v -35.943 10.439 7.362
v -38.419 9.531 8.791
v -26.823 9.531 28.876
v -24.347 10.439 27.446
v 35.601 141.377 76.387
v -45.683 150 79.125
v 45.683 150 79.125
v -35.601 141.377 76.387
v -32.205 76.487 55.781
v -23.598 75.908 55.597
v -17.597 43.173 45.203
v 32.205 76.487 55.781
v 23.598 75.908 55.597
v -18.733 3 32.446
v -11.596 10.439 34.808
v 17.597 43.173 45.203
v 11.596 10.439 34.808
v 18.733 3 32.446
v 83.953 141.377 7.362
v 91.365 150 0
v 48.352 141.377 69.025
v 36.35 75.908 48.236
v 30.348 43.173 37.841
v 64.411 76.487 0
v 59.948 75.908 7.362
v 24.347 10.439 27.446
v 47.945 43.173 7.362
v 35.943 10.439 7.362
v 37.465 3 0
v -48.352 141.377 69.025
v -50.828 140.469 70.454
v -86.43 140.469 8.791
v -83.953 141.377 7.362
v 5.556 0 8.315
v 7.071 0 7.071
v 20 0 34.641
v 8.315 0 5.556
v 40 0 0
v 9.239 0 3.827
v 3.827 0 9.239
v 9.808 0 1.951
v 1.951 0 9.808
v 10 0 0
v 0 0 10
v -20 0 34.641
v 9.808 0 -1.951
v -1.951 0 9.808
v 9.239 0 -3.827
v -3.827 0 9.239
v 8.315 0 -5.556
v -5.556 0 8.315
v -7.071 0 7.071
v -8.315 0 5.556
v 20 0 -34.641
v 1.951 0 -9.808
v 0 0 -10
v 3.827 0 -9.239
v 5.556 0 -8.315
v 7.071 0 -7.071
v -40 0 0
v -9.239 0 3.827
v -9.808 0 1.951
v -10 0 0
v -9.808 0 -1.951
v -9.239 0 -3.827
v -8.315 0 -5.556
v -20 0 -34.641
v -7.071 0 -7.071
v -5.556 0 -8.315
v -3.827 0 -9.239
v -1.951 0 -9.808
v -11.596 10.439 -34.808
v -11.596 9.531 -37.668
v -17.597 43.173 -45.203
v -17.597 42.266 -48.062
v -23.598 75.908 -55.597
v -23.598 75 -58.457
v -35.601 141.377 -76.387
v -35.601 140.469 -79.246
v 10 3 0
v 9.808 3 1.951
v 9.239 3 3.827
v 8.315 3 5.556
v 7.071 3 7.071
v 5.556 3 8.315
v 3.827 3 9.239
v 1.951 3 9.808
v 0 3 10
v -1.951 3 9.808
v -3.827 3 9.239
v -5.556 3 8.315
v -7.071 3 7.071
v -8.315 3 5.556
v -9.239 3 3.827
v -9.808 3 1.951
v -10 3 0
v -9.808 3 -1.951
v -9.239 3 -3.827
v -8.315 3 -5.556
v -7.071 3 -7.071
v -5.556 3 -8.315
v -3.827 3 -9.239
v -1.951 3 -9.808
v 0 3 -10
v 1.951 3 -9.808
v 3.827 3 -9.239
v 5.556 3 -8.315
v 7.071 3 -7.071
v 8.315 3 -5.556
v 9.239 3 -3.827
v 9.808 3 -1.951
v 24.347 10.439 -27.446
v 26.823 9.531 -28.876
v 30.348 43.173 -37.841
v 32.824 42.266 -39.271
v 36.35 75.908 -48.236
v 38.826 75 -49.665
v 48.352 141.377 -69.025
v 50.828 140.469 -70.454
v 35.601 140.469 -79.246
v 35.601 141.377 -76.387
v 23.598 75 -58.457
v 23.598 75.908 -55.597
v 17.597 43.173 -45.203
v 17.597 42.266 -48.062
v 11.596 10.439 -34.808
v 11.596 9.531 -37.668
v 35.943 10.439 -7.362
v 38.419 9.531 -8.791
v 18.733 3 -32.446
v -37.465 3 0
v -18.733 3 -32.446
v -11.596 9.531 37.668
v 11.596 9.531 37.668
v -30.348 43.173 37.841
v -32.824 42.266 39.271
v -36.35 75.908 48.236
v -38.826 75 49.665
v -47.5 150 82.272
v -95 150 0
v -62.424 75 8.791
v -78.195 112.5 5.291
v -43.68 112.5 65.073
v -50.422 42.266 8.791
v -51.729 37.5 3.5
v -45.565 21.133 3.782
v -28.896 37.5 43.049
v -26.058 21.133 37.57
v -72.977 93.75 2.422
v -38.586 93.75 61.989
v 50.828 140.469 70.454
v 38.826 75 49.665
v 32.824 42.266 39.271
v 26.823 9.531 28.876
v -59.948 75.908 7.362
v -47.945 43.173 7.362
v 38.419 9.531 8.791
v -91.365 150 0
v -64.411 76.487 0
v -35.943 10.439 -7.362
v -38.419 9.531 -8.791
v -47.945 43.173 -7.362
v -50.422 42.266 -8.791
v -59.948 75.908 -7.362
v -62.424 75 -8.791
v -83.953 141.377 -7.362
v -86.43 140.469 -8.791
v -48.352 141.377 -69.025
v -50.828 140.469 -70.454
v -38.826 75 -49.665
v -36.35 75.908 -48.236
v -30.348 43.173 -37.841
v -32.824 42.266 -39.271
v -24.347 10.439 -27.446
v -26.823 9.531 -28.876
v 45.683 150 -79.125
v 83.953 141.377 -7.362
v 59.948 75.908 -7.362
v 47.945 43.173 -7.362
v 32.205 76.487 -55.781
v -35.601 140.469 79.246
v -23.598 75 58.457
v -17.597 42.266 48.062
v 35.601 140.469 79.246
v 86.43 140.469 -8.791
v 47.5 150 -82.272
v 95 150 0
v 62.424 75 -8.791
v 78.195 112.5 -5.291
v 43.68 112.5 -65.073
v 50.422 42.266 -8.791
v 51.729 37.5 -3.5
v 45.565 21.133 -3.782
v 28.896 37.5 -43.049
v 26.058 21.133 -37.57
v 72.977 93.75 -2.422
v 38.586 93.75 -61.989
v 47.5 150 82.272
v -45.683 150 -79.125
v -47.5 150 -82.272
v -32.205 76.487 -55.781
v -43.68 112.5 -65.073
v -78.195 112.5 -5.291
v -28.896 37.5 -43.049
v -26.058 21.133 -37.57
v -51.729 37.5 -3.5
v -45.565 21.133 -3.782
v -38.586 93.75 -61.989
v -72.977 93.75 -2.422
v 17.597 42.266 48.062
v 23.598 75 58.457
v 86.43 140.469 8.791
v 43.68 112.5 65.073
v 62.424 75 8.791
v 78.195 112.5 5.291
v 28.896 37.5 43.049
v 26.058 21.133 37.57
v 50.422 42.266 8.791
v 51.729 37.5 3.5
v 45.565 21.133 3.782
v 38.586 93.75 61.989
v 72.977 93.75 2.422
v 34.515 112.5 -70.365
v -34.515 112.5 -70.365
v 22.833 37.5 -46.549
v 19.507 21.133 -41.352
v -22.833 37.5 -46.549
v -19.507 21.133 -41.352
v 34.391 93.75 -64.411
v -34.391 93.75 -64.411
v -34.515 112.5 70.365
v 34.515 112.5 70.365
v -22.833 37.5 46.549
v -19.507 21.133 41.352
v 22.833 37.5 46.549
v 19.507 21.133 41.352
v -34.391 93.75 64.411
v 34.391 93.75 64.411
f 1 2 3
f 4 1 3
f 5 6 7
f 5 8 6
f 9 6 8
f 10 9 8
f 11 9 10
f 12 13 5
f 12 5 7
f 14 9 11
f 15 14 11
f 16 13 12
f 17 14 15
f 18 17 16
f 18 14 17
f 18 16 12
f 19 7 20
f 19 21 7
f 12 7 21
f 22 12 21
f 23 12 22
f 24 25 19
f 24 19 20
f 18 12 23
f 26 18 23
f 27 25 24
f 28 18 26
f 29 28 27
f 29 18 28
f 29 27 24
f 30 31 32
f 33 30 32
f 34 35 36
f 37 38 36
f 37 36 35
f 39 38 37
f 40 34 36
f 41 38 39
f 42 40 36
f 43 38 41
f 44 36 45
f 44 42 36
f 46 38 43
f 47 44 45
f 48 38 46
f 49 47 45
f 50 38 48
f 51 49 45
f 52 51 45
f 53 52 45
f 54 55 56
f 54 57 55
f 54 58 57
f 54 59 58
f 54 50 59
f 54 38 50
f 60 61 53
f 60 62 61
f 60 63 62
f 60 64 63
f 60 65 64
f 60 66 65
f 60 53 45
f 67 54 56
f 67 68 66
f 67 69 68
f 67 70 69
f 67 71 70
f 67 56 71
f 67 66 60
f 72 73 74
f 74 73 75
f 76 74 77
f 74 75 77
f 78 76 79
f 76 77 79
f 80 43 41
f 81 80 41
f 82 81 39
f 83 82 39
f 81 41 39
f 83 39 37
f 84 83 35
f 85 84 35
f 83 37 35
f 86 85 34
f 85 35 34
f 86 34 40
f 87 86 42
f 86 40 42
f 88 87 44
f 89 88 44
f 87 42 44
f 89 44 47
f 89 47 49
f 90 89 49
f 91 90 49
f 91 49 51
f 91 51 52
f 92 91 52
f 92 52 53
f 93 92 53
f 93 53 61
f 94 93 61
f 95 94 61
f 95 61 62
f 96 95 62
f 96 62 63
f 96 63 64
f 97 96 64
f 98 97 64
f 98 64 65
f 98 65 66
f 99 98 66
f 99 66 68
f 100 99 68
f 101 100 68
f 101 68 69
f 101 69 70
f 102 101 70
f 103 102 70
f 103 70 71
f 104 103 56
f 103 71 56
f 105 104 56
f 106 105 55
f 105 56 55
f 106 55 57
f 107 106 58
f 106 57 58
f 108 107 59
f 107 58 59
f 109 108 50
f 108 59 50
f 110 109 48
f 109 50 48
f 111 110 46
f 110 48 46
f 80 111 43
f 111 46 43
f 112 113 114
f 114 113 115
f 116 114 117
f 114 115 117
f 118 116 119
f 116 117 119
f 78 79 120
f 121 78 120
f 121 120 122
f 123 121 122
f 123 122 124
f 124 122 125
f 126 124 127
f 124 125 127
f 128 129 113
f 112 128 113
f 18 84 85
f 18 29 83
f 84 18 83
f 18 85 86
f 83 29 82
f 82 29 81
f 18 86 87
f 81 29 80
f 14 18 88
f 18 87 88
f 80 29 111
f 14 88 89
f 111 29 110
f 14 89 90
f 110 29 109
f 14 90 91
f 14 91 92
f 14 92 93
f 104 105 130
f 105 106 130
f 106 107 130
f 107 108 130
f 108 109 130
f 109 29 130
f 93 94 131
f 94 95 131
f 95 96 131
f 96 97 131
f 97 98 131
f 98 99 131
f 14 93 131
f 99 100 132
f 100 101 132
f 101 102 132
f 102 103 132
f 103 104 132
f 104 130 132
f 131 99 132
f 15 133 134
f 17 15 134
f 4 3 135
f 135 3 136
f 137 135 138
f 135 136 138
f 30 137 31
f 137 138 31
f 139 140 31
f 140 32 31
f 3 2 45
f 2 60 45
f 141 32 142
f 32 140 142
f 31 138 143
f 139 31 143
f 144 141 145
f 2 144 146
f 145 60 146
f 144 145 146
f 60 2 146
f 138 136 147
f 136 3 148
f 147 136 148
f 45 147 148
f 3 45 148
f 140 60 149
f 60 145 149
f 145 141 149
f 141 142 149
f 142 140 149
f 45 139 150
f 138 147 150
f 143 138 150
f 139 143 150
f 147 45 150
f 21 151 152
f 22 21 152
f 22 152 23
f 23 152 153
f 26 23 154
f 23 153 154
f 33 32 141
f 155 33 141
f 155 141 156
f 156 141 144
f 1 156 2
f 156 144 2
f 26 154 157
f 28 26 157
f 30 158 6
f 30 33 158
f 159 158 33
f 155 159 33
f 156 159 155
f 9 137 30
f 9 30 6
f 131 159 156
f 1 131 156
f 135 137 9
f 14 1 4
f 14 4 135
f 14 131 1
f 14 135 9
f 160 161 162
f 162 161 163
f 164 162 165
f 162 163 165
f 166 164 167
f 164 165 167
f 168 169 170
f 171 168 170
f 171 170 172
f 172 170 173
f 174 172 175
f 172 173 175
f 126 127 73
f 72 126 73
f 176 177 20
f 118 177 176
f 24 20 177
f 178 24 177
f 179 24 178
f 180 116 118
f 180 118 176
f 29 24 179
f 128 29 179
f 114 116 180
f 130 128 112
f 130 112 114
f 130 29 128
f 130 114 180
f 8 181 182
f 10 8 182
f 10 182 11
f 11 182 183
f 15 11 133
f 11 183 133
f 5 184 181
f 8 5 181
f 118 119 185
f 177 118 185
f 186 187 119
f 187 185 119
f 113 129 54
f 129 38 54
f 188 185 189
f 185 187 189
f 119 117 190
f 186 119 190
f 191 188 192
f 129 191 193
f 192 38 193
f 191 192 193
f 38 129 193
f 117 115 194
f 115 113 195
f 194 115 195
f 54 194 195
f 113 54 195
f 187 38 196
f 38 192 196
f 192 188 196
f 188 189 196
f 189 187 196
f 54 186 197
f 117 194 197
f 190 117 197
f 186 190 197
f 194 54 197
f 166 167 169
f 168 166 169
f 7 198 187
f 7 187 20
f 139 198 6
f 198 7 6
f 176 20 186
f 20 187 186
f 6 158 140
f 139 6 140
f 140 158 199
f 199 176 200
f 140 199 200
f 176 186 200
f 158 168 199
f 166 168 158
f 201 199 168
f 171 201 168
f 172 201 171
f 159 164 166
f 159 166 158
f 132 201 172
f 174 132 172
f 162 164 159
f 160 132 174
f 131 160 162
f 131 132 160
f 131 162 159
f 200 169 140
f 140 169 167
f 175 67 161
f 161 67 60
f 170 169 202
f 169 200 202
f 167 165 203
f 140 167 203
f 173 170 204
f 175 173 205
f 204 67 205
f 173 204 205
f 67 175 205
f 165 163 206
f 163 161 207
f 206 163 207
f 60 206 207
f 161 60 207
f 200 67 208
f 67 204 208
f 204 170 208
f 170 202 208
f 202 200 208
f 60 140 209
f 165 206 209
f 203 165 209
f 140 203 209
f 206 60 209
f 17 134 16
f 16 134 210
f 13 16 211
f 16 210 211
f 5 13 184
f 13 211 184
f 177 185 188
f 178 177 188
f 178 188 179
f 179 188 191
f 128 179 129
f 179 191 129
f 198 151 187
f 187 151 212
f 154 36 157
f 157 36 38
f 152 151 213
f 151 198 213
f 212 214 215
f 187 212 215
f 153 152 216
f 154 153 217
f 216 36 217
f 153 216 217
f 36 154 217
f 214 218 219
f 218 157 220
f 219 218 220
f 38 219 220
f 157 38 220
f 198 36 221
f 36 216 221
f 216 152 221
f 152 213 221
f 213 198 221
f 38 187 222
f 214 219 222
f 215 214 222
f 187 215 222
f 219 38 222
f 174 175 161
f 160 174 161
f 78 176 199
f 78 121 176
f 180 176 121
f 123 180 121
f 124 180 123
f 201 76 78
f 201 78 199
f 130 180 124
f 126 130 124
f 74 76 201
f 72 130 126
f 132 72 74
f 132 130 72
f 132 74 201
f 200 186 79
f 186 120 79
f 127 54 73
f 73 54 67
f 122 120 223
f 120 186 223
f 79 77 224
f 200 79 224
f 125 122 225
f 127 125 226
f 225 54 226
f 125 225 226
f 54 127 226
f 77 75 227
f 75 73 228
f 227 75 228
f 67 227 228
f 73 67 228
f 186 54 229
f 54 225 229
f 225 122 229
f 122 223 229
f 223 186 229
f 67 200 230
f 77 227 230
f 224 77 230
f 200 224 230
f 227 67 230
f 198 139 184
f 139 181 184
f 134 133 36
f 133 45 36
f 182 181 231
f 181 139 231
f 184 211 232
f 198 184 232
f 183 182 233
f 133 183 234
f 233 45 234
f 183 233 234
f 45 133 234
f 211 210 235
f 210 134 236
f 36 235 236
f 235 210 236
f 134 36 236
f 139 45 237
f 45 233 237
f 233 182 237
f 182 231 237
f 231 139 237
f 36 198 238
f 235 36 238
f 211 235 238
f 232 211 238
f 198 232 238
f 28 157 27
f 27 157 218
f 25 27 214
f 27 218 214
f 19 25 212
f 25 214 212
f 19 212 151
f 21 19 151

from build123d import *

# Parameters (mm, degrees)
VACIADO1_T            = -3
CORTAR_EXTRUIR1_DEPTH = 3
CORTAR_EXTRUIR2_REACH = 152
CROQUIS4_R            = 10
MATRIZC1_COUNT        = 6


with BuildPart() as part:
    # Croquis2 → Recubrir1 section 0
    with BuildSketch(Plane(origin=(0, 150, 0), x_dir=(-1, 0, 0), z_dir=(0, 1, 0))):
        Polygon((-95, 0), (-47.5, -82.27241336), (47.5, -82.27241336), (95, 0), (47.5, 82.27241336), (-47.5, 82.27241336), align=None)
    # Croquis1 → Recubrir1 section 1
    with BuildSketch(Plane(origin=(0, 0, 0), x_dir=(1, 0, 0), z_dir=(0, 1, 0))):
        Polygon((-40, 0), (-20, -34.641016151), (20, -34.641016151), (40, 0), (20, 34.641016151), (-20, 34.641016151), align=None)
    loft()

    # Vaciado1
    vaciado1_openings = [part.faces().sort_by_distance(p)[0] for p in [
        (0, 150, 0),
    ]]
    offset(amount=VACIADO1_T, openings=vaciado1_openings, kind=Kind.INTERSECTION)

    # Croquis3 → Cortar-Extruir1 (cut)
    with BuildSketch(Plane(origin=(0, -9.992429977, 31.467993476), x_dir=(1, 0, 0), z_dir=(0, -0.302650417, 0.953101634))):
        Polygon((-11.595838701, 20.484117977), (11.595838701, 20.484117977), (35.601132708, 157.865025332), (-35.601132708, 157.865025332), align=None)
    cortar_extruir1 = extrude(amount=-CORTAR_EXTRUIR1_DEPTH, mode=Mode.SUBTRACT)

    # Croquis4 → Cortar-Extruir2 (cut, up to next)
    with BuildSketch(Plane.XZ, mode=Mode.PRIVATE) as cortar_extruir2_sk1:
        Circle(CROQUIS4_R)
    cortar_extruir2_tool1 = extrude(cortar_extruir2_sk1.sketch, amount=-CORTAR_EXTRUIR2_REACH, mode=Mode.PRIVATE) & part.part
    add(cortar_extruir2_tool1.solids().sort_by_distance((0, 0, 0))[0], mode=Mode.SUBTRACT)

    # MatrizC1: Cortar-Extruir1 ×6 about axis
    matrizc1_axis = Axis((0, 0, 0), (0, 1, 0))
    for i in range(1, MATRIZC1_COUNT):
        add(cortar_extruir1.rotate(matrizc1_axis, i * 360 / MATRIZC1_COUNT), mode=Mode.SUBTRACT)


solid = part.part
